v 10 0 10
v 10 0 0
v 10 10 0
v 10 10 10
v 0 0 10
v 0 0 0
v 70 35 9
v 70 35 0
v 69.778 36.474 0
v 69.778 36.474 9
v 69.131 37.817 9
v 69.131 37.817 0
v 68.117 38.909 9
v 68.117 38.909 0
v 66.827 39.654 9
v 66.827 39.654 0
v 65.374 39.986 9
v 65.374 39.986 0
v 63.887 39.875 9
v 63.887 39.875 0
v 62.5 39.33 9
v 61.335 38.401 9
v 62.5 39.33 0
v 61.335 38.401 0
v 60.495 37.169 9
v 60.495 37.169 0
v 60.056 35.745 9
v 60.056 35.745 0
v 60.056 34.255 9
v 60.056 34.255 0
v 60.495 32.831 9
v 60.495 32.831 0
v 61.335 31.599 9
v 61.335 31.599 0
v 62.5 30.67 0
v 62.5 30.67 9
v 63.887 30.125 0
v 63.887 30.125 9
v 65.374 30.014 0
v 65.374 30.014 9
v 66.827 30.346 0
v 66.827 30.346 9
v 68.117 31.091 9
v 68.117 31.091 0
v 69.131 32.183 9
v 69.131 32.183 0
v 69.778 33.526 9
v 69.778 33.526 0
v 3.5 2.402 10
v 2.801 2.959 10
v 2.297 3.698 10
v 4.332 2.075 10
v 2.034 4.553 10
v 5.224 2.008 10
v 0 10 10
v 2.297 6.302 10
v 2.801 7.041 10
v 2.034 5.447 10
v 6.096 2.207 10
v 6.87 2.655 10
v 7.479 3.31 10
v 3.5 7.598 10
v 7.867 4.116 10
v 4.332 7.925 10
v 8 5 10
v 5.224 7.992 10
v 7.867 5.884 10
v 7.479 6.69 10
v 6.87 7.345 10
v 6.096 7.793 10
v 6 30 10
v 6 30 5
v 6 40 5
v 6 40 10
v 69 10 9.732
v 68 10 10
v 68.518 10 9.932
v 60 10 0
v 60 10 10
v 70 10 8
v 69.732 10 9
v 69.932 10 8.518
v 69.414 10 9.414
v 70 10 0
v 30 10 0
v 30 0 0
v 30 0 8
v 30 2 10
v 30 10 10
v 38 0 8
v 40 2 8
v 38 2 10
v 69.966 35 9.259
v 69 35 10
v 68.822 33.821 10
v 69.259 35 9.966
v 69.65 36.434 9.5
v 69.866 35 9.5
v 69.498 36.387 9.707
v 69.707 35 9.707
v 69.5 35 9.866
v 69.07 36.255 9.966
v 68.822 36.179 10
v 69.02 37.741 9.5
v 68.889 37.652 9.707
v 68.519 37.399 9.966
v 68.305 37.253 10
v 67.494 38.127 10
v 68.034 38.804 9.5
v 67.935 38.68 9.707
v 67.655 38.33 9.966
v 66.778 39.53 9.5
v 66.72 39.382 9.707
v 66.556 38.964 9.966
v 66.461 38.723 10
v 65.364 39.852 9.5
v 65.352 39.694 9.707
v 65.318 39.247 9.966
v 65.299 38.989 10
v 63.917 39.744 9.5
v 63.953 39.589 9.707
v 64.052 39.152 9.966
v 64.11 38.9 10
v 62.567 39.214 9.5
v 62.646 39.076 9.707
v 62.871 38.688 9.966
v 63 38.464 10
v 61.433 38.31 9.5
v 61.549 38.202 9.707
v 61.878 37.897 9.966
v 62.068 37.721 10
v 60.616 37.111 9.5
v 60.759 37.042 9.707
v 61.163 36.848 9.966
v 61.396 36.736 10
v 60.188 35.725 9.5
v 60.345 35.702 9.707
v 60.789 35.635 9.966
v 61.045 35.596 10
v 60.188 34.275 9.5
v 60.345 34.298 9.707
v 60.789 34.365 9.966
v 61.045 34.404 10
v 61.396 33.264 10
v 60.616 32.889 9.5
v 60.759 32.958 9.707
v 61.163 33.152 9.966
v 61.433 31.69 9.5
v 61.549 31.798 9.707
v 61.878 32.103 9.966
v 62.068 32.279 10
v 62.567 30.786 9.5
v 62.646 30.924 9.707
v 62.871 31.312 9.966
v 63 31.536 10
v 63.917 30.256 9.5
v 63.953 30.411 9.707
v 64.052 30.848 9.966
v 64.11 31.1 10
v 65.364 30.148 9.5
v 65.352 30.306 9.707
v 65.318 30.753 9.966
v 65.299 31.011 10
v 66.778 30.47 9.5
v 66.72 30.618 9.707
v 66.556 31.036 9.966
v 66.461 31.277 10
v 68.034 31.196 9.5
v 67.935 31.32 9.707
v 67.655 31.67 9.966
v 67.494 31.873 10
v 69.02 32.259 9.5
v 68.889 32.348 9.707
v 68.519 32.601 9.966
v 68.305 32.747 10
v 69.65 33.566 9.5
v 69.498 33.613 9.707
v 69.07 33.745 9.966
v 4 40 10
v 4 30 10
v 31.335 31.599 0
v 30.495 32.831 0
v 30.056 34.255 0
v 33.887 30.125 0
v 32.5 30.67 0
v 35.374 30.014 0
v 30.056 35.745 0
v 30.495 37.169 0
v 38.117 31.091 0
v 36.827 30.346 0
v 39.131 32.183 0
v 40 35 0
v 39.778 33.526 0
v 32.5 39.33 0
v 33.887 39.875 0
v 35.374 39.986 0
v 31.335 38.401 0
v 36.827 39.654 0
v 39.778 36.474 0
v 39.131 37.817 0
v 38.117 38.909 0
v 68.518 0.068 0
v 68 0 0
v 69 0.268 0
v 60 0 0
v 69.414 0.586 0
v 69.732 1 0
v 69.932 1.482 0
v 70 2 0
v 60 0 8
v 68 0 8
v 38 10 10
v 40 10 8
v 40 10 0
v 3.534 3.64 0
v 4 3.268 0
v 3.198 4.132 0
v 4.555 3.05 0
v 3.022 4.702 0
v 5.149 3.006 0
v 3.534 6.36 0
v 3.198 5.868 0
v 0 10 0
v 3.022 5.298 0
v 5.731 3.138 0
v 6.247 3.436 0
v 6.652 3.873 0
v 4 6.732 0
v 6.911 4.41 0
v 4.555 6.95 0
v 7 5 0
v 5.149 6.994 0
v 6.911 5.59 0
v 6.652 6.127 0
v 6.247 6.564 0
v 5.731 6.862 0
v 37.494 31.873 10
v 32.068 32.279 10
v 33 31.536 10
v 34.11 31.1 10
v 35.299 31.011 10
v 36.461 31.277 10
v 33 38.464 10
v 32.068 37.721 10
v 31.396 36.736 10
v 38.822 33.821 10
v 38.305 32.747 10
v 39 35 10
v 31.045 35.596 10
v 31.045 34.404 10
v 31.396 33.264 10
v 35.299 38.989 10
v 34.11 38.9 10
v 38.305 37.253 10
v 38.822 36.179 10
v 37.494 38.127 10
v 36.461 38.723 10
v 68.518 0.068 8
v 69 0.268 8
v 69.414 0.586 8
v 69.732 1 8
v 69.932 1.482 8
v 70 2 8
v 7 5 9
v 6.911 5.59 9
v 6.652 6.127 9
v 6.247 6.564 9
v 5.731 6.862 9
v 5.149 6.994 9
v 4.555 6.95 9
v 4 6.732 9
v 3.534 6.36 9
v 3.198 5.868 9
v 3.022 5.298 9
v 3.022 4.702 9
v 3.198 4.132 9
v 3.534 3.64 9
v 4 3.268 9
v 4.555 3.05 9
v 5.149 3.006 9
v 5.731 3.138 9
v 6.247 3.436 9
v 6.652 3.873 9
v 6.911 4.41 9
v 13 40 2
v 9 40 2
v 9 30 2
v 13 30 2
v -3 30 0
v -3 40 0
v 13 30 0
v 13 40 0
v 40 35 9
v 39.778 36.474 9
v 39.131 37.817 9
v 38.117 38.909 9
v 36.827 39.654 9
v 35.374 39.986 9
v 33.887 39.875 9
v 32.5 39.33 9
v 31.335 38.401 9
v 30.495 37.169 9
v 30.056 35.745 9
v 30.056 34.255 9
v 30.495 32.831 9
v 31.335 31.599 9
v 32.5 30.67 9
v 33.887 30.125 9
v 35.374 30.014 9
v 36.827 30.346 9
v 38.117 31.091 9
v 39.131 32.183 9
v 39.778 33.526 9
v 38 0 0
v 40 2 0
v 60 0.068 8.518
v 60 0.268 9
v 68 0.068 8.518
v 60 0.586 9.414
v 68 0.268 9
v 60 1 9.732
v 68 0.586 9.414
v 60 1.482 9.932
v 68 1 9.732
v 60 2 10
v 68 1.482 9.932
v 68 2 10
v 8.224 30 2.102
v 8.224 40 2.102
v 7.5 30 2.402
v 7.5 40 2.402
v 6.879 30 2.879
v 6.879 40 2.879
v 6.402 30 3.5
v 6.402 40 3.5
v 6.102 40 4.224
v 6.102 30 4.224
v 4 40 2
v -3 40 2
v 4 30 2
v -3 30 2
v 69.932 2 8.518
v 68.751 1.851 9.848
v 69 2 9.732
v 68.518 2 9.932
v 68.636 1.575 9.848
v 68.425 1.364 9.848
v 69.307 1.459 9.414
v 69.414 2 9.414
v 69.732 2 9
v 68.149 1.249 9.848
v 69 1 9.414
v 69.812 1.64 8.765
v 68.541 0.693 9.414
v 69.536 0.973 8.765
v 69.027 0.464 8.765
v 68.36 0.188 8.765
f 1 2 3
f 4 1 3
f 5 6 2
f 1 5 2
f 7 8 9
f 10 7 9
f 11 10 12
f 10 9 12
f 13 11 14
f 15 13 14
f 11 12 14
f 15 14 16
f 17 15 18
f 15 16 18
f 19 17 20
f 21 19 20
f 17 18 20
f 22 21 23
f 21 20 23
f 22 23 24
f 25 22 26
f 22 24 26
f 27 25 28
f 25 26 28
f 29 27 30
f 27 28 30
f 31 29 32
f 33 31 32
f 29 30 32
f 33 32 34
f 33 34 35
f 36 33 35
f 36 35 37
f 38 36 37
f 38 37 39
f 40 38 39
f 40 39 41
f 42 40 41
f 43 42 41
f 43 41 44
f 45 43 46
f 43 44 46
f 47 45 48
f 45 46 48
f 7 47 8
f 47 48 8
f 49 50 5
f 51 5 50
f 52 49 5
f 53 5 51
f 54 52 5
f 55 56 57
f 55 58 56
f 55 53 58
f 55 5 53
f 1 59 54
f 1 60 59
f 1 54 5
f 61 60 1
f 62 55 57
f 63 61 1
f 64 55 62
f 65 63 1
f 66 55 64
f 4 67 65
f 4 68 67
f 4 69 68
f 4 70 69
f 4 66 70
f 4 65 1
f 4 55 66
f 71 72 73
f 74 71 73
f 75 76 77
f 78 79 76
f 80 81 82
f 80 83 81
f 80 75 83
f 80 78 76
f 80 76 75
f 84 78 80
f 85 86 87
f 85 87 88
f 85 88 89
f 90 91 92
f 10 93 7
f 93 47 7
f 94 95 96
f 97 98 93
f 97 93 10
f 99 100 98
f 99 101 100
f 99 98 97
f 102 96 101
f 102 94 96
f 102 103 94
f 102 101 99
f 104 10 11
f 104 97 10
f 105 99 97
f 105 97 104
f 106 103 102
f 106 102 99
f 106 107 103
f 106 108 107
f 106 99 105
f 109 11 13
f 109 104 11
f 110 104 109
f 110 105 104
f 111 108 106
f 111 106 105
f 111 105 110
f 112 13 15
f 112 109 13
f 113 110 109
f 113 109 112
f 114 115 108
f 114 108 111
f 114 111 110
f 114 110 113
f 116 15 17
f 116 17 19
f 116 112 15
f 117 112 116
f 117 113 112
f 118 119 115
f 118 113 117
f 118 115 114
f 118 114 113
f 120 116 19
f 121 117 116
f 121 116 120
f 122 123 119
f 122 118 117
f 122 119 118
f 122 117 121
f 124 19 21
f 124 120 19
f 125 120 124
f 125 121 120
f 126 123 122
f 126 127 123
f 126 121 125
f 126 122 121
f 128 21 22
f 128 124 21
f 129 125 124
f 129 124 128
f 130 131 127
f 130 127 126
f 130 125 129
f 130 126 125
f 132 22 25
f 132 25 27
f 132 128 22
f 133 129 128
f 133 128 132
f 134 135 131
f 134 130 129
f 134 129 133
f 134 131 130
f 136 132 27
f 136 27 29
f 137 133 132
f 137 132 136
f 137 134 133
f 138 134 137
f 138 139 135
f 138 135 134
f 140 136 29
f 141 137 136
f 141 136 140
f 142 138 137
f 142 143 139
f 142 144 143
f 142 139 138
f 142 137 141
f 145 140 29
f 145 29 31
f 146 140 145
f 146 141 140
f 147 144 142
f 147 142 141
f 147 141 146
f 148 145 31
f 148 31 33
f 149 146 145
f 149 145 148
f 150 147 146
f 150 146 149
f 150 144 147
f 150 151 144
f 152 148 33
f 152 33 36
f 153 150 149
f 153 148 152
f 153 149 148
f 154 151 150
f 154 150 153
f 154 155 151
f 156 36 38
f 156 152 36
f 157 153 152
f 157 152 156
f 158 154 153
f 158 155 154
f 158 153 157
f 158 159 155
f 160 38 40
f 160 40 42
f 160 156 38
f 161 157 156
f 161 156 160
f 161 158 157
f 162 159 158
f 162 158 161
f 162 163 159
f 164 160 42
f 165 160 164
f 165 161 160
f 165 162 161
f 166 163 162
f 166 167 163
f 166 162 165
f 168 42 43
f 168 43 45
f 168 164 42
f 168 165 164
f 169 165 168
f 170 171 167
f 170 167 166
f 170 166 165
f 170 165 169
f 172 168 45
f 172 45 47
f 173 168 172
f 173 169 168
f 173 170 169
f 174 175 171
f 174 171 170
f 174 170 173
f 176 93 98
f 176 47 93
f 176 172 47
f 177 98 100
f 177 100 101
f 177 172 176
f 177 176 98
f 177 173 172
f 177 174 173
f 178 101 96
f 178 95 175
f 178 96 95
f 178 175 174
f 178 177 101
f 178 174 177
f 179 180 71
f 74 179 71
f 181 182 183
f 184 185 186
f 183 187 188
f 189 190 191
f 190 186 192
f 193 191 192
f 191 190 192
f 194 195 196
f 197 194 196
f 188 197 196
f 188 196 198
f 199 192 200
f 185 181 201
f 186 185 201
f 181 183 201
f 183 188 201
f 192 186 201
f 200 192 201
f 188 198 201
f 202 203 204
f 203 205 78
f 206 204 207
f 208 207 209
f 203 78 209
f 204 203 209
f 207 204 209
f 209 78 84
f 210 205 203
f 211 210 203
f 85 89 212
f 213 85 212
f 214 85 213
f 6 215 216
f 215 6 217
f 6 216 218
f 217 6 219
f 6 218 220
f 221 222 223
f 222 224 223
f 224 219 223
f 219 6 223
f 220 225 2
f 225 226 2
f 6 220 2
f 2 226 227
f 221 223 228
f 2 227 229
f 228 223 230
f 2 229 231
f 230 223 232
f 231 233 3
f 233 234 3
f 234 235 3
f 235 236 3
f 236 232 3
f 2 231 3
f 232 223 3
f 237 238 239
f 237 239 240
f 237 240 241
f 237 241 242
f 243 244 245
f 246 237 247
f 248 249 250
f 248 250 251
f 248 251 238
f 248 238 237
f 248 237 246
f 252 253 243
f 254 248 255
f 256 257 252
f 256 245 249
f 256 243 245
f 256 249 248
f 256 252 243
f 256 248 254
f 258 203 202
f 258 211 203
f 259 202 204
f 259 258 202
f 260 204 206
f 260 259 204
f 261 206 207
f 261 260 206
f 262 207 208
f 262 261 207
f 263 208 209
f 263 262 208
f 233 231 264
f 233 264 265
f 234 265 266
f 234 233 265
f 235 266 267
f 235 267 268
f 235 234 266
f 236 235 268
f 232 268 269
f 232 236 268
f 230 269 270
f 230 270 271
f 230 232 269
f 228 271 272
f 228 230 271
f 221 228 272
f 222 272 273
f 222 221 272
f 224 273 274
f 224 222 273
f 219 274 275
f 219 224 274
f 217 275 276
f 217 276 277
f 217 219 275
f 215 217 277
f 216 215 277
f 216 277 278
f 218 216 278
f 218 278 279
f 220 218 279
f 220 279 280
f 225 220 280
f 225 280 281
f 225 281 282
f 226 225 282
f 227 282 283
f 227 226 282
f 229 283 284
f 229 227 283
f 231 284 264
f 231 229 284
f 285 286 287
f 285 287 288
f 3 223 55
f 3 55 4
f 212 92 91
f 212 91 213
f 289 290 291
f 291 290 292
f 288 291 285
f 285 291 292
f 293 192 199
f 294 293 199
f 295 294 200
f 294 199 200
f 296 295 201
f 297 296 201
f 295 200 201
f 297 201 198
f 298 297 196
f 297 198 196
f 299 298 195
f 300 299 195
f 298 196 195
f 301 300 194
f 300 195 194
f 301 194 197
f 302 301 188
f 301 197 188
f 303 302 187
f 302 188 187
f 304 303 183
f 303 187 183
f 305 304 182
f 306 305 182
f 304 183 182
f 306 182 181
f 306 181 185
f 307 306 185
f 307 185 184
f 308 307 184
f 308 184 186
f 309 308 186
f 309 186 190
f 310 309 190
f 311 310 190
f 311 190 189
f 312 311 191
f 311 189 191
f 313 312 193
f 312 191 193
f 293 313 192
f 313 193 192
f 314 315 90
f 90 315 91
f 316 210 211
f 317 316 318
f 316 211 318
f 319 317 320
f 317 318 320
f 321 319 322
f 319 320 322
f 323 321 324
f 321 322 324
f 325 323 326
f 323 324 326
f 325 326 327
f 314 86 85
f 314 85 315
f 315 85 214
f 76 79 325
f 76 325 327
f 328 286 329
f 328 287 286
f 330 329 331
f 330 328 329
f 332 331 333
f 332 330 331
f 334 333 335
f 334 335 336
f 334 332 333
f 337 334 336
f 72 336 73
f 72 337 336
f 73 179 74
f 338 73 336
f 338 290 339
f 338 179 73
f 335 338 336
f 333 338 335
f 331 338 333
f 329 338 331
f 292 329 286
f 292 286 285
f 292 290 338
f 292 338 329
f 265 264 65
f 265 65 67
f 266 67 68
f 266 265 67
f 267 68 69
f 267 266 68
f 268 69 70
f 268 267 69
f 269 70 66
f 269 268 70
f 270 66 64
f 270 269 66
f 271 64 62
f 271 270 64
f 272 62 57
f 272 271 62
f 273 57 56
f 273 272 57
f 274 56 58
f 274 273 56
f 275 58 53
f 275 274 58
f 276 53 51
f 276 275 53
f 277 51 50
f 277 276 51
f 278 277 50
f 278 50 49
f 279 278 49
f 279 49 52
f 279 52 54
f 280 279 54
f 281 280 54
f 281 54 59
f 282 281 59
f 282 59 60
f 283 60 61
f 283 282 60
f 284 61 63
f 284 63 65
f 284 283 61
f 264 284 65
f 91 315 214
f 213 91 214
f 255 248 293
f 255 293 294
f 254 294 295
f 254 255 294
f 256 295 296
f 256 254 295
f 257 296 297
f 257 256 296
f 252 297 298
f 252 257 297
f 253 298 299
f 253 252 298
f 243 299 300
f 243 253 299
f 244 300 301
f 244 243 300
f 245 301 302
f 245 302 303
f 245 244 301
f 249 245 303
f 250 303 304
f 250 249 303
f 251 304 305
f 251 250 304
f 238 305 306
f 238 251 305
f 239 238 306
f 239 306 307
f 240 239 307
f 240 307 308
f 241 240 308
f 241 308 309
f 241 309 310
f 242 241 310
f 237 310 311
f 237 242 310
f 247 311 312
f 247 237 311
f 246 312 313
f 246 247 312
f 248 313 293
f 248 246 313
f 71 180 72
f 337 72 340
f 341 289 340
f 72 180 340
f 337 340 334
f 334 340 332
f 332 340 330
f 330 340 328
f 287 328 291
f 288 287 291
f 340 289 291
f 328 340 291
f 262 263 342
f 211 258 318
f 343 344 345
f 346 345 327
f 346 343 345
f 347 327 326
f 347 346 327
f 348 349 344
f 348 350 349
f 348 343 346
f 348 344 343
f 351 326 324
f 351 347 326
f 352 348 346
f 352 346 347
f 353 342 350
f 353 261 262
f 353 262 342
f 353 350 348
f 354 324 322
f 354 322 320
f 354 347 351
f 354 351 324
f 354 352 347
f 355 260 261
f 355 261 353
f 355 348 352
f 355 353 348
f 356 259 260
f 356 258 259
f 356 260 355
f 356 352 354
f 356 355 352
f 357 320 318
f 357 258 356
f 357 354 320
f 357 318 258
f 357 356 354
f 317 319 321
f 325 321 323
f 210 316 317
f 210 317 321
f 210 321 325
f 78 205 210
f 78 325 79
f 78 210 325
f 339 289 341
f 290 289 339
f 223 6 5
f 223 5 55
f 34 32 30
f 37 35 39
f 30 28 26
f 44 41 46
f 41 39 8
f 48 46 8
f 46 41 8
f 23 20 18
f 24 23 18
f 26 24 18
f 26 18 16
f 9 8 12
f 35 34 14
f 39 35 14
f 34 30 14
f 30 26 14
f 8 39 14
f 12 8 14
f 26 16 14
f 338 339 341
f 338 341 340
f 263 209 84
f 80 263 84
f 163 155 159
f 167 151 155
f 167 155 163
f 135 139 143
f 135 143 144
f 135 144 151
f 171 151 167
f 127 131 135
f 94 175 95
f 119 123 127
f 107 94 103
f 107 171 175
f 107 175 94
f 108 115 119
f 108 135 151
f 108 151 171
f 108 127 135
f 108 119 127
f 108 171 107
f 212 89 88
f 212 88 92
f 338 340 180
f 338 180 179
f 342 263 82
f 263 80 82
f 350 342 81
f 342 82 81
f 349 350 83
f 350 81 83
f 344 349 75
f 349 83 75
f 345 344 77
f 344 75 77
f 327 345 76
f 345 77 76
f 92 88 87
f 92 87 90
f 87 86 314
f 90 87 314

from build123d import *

# Parameters (mm, degrees)
BOX002_W          = 10
BOX002_H          = 10
BOX002_DEPTH      = 10
FILLET_R          = 2
BOX001_W          = 10
BOX001_H          = 10
BOX001_DEPTH      = 10
CHAMFER_SIZE      = 2
CYLINDER_R        = 2
CYLINDER_DEPTH    = 10
BOX_W             = 10
BOX_H             = 10
BOX_DEPTH         = 10
CHAMFER001_SIZE   = 1
CYLINDER001_R     = 5
CYLINDER001_DEPTH = 10
FILLET001_R       = 1
CYLINDER002_R     = 5
CYLINDER002_DEPTH = 10
CHAMFER002_SIZE   = 1
BOX004_W          = 2
BOX004_H          = 10
BOX004_DEPTH      = 10
BOX003_W          = 16
BOX003_H          = 10
BOX003_DEPTH      = 2
FILLET002_R       = 3


with BuildPart() as fillet_body:
    # Box002 → Box002 (new body)
    with BuildSketch(Plane(origin=(60, 0, 0), x_dir=(1, 0, 0), z_dir=(0, 0, 1))):
        with Locations((5, 5)):
            Rectangle(BOX002_W, BOX002_H)
    extrude(amount=BOX002_DEPTH)

    # Fillet
    fillet_edges = [fillet_body.edges().sort_by_distance(p)[0] for p in [
        (70, 0, 5),
        (70, 5, 10),
        (65, 0, 10),
    ]]
    fillet(fillet_edges, radius=FILLET_R)


with BuildPart() as chamfer_body:
    # Box001 → Box001 (new body)
    with BuildSketch(Plane(origin=(30, 0, 0), x_dir=(1, 0, 0), z_dir=(0, 0, 1))):
        with Locations((5, 5)):
            Rectangle(BOX001_W, BOX001_H)
    extrude(amount=BOX001_DEPTH)

    # Chamfer
    chamfer_edges = [chamfer_body.edges().sort_by_distance(p)[0] for p in [
        (40, 0, 5),
        (40, 5, 10),
        (35, 0, 10),
    ]]
    chamfer(chamfer_edges, length=CHAMFER_SIZE)


with BuildPart() as cylinder:
    # Cylinder → Cylinder (new body)
    with BuildSketch(Plane(origin=(5, 5, 0), x_dir=(1, 0, 0), z_dir=(0, 0, 1))):
        Circle(CYLINDER_R)
    extrude(amount=CYLINDER_DEPTH)


with BuildPart() as chamfer001:
    # Box → Box (new body)
    with BuildSketch(Plane.XY):
        with Locations((5, 5)):
            Rectangle(BOX_W, BOX_H)
    extrude(amount=BOX_DEPTH)

    # Cut: cut Cylinder
    add(cylinder.part, mode=Mode.SUBTRACT)

    # Chamfer001
    chamfer001_edges = [chamfer001.edges().sort_by_distance(p)[0] for p in [
        (3, 5, 10),
    ]]
    chamfer(chamfer001_edges, length=CHAMFER001_SIZE)


with BuildPart() as fillet001:
    # Cylinder001 → Cylinder001 (new body)
    with BuildSketch(Plane(origin=(65, 35, 0), x_dir=(1, 0, 0), z_dir=(0, 0, 1))):
        Circle(CYLINDER001_R)
    extrude(amount=CYLINDER001_DEPTH)

    # Fillet001
    fillet001_edges = [fillet001.edges().sort_by_distance(p)[0] for p in [
        (60, 35, 10),
    ]]
    fillet(fillet001_edges, radius=FILLET001_R)


with BuildPart() as chamfer002:
    # Cylinder002 → Cylinder002 (new body)
    with BuildSketch(Plane(origin=(35, 35, 0), x_dir=(1, 0, 0), z_dir=(0, 0, 1))):
        Circle(CYLINDER002_R)
    extrude(amount=CYLINDER002_DEPTH)

    # Chamfer002
    chamfer002_edges = [chamfer002.edges().sort_by_distance(p)[0] for p in [
        (30, 35, 10),
    ]]
    chamfer(chamfer002_edges, length=CHAMFER002_SIZE)


with BuildPart() as cube004:
    # Box004 → Box004 (new body)
    with BuildSketch(Plane(origin=(4, 30, 0), x_dir=(1, 0, 0), z_dir=(0, 0, 1))):
        with Locations((1, 5)):
            Rectangle(BOX004_W, BOX004_H)
    extrude(amount=BOX004_DEPTH)


with BuildPart() as fillet002:
    # Box003 → Box003 (new body)
    with BuildSketch(Plane(origin=(-3, 30, 0), x_dir=(1, 0, 0), z_dir=(0, 0, 1))):
        with Locations((8, 5)):
            Rectangle(BOX003_W, BOX003_H)
    extrude(amount=BOX003_DEPTH)

    # Fusion: union Cube004
    add(cube004.part)

    # Fillet002
    fillet002_edges = [fillet002.edges().sort_by_distance(p)[0] for p in [
        (6, 35, 2),
    ]]
    fillet(fillet002_edges, radius=FILLET002_R)


solid = Compound([fillet_body.part, chamfer_body.part, chamfer001.part, fillet001.part, chamfer002.part, fillet002.part])
